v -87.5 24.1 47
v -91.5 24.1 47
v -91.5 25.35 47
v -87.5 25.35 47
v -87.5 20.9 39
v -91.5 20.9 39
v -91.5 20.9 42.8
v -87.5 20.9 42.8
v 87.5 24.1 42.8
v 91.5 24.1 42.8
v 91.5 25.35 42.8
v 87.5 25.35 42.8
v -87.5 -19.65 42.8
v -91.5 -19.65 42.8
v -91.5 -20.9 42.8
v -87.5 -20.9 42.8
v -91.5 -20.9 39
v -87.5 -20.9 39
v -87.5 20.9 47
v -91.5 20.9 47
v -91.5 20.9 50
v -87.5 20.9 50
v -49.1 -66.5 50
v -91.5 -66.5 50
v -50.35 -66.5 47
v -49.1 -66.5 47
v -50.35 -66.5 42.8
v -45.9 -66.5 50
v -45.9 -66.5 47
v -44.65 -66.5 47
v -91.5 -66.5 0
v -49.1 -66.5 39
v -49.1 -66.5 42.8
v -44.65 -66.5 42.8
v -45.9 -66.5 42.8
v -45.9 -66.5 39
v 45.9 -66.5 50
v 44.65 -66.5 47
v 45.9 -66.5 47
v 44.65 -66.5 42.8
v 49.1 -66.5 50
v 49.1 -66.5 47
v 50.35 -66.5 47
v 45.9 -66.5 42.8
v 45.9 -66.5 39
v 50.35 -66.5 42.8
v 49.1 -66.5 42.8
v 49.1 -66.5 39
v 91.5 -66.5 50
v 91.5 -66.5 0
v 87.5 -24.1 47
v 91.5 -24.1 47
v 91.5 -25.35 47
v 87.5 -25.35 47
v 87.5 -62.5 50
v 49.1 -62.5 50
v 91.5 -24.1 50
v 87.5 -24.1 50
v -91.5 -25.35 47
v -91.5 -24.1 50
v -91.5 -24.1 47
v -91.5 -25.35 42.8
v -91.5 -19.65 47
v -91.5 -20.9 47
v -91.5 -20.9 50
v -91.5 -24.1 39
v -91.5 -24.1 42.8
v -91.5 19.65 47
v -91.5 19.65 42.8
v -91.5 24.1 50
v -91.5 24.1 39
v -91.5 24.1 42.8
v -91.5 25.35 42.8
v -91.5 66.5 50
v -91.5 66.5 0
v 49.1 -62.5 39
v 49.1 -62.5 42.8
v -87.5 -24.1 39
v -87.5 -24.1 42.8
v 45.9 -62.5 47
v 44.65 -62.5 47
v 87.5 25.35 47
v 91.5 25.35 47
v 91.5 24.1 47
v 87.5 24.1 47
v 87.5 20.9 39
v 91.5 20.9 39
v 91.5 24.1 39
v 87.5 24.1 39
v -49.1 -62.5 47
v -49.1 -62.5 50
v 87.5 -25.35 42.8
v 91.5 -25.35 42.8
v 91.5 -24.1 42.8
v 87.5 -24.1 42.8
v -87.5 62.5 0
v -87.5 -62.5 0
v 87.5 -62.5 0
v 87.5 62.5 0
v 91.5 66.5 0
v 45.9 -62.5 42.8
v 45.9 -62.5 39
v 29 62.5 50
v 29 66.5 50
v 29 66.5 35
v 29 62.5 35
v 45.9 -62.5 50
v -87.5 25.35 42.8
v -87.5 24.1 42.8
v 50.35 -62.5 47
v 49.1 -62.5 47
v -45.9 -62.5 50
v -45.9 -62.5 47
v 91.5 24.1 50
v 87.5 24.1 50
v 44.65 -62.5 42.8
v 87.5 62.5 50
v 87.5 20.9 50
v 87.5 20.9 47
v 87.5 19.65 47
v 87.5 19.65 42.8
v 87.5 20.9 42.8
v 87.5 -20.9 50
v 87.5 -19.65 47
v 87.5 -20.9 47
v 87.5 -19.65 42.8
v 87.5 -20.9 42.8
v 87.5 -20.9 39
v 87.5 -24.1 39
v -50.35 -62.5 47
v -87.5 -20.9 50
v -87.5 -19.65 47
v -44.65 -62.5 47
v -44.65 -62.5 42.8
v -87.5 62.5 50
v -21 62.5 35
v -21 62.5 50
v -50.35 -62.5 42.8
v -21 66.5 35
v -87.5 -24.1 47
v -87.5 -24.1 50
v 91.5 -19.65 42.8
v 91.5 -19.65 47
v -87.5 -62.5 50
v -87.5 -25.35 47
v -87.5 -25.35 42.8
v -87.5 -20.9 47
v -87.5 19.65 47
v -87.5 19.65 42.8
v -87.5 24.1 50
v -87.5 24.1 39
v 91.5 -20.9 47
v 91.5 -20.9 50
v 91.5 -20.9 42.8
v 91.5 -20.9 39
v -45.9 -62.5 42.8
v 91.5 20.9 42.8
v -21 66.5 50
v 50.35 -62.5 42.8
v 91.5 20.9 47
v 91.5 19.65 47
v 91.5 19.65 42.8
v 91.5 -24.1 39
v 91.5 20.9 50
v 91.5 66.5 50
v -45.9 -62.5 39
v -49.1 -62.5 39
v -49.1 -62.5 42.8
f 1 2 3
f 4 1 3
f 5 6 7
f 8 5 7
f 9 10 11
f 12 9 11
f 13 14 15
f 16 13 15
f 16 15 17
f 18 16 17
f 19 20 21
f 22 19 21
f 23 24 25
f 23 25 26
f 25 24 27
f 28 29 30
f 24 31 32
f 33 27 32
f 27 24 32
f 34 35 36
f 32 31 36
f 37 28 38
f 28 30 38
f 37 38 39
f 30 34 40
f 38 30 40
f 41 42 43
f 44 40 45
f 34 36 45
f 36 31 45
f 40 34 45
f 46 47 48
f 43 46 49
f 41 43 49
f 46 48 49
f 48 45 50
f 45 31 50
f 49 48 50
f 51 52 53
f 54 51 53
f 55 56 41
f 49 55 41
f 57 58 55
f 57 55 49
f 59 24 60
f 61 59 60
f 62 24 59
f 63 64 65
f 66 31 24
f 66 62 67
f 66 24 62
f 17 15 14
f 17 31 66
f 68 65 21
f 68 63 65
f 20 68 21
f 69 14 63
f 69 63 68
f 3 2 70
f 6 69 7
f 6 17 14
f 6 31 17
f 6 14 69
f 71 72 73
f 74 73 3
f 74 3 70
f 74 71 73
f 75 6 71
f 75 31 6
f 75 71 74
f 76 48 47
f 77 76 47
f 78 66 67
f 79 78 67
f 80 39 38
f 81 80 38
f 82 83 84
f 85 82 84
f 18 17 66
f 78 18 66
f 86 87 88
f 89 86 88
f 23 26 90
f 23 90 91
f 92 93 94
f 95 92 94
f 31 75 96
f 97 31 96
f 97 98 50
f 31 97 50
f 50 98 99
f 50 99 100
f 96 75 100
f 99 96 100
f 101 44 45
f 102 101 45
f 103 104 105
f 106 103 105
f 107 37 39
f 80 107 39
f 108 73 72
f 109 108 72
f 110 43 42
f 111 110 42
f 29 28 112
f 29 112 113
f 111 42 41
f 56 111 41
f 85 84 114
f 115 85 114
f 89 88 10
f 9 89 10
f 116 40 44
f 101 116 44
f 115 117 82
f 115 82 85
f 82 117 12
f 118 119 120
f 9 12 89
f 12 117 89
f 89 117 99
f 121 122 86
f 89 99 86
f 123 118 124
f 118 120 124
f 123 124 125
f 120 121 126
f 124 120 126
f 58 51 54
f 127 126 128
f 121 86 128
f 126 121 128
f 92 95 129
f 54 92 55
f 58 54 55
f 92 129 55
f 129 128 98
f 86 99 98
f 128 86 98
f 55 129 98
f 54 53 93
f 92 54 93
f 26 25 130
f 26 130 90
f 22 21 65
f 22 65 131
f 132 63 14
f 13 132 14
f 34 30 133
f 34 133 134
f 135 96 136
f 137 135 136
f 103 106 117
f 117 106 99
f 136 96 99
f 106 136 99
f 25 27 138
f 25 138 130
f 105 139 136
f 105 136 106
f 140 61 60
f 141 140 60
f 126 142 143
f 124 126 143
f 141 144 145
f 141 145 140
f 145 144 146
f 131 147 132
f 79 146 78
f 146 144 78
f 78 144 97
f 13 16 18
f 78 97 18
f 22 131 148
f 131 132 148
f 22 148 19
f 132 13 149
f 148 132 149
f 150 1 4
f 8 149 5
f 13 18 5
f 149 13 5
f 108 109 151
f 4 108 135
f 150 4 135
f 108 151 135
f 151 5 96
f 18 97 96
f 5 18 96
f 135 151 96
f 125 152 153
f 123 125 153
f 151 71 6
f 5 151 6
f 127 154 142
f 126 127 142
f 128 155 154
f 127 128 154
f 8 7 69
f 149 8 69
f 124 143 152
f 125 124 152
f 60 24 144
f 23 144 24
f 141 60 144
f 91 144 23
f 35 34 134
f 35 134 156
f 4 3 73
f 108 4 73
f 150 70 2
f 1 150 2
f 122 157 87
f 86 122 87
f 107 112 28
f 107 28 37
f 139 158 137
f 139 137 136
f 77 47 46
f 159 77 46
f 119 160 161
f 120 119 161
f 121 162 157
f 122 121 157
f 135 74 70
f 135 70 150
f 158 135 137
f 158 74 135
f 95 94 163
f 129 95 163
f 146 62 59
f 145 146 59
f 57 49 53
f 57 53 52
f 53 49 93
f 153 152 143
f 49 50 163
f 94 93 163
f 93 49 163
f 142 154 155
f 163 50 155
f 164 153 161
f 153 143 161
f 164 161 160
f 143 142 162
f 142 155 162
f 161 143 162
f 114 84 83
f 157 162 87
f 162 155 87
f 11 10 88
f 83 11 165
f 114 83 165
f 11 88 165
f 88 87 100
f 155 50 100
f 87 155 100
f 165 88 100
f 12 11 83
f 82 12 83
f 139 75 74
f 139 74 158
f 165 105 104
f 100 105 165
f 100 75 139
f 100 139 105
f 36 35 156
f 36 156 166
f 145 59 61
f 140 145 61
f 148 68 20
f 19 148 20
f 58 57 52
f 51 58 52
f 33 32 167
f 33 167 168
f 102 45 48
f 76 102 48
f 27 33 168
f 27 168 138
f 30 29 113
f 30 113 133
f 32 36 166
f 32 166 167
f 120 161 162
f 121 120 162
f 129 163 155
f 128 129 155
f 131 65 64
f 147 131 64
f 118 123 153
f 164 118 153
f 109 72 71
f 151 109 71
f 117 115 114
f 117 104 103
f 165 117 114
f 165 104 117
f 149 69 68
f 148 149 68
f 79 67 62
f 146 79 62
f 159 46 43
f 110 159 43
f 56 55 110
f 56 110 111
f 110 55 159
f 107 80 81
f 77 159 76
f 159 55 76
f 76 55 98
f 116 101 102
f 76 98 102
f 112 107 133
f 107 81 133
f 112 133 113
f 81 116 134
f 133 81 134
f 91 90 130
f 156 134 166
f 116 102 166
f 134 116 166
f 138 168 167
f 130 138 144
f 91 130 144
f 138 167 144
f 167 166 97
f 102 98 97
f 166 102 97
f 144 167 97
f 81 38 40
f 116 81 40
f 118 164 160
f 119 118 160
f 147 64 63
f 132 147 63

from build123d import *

# Parameters (mm, degrees)
ESQUISSE2_W             = 183
ESQUISSE2_H             = 133
BOSS_EXTRU_2_DEPTH      = 50
ESQUISSE3_W             = 50
ESQUISSE3_H             = 15
ENL_V_MAT_EXTRU_1_DEPTH = 50
ENL_V_MAT_EXTRU_3_DEPTH = 4
ENL_V_MAT_EXTRU_4_DEPTH = 4
ENL_V_MAT_EXTRU_5_DEPTH = 4


with BuildPart() as part:
    # Esquisse2 → Boss.-Extru.2 (new body)
    with BuildSketch(Plane.XY):
        Rectangle(ESQUISSE2_W, ESQUISSE2_H)
        Polygon((-85.996240602, -62.5), (-87.5, -62.5), (-87.5, 62.5), (87.5, 62.5), (87.5, -62.5), align=None, mode=Mode.SUBTRACT)
    extrude(amount=BOSS_EXTRU_2_DEPTH)

    # Esquisse3 → Enlèv. mat.-Extru.1 (cut)
    with BuildSketch(Plane(origin=(0, 66.5, 0), x_dir=(1, 0, 0), z_dir=(0, 1, 0))):
        with Locations((4, -42.5)):
            Rectangle(ESQUISSE3_W, ESQUISSE3_H)
    extrude(amount=-ENL_V_MAT_EXTRU_1_DEPTH, mode=Mode.SUBTRACT)

    # Esquisse6 → Enlèv. mat.-Extru.3 (cut)
    with BuildSketch(Plane(origin=(91.5, 0, 0), x_dir=(0, 0, -1), z_dir=(1, 0, 0))):
        Polygon((-50, 20.9), (-47, 20.9), (-47, 19.65), (-42.8, 19.65), (-42.8, 20.9), (-39, 20.9), (-39, 24.1), (-42.8, 24.1), (-42.8, 25.35), (-47, 25.35), (-47, 24.1), (-50, 24.1), align=None)
        Polygon((-50, -24.1), (-47, -24.1), (-47, -25.35), (-42.8, -25.35), (-42.8, -24.1), (-39, -24.1), (-39, -20.9), (-42.8, -20.9), (-42.8, -19.65), (-47, -19.65), (-47, -20.9), (-50, -20.9), align=None)
    extrude(amount=-ENL_V_MAT_EXTRU_3_DEPTH, mode=Mode.SUBTRACT)

    # Esquisse7 → Enlèv. mat.-Extru.4 (cut)
    with BuildSketch(Plane.ZY.offset(91.5)):
        Polygon((47, 20.9), (50, 20.9), (50, 24.1), (47, 24.1), (47, 25.35), (42.8, 25.35), (42.8, 24.1), (39, 24.1), (39, 20.9), (42.8, 20.9), (42.8, 19.65), (47, 19.65), align=None)
        Polygon((47, -24.1), (50, -24.1), (50, -20.9), (47, -20.9), (47, -19.65), (42.8, -19.65), (42.8, -20.9), (39, -20.9), (39, -24.1), (42.8, -24.1), (42.8, -25.35), (47, -25.35), align=None)
    extrude(amount=-ENL_V_MAT_EXTRU_4_DEPTH, mode=Mode.SUBTRACT)

    # Esquisse9 → Enlèv. mat.-Extru.5 (cut)
    with BuildSketch(Plane.XZ.offset(66.5)):
        Polygon((-49.1, 50), (-45.9, 50), (-45.9, 47), (-44.65, 47), (-44.65, 42.8), (-45.9, 42.8), (-45.9, 39), (-49.1, 39), (-49.1, 42.8), (-50.35, 42.8), (-50.35, 47), (-49.1, 47), align=None)
        Polygon((45.9, 50), (45.9, 47), (44.65, 47), (44.65, 42.8), (45.9, 42.8), (45.9, 39), (49.1, 39), (49.1, 42.8), (50.35, 42.8), (50.35, 47), (49.1, 47), (49.1, 50), align=None)
    extrude(amount=-ENL_V_MAT_EXTRU_5_DEPTH, mode=Mode.SUBTRACT)


solid = part.part
